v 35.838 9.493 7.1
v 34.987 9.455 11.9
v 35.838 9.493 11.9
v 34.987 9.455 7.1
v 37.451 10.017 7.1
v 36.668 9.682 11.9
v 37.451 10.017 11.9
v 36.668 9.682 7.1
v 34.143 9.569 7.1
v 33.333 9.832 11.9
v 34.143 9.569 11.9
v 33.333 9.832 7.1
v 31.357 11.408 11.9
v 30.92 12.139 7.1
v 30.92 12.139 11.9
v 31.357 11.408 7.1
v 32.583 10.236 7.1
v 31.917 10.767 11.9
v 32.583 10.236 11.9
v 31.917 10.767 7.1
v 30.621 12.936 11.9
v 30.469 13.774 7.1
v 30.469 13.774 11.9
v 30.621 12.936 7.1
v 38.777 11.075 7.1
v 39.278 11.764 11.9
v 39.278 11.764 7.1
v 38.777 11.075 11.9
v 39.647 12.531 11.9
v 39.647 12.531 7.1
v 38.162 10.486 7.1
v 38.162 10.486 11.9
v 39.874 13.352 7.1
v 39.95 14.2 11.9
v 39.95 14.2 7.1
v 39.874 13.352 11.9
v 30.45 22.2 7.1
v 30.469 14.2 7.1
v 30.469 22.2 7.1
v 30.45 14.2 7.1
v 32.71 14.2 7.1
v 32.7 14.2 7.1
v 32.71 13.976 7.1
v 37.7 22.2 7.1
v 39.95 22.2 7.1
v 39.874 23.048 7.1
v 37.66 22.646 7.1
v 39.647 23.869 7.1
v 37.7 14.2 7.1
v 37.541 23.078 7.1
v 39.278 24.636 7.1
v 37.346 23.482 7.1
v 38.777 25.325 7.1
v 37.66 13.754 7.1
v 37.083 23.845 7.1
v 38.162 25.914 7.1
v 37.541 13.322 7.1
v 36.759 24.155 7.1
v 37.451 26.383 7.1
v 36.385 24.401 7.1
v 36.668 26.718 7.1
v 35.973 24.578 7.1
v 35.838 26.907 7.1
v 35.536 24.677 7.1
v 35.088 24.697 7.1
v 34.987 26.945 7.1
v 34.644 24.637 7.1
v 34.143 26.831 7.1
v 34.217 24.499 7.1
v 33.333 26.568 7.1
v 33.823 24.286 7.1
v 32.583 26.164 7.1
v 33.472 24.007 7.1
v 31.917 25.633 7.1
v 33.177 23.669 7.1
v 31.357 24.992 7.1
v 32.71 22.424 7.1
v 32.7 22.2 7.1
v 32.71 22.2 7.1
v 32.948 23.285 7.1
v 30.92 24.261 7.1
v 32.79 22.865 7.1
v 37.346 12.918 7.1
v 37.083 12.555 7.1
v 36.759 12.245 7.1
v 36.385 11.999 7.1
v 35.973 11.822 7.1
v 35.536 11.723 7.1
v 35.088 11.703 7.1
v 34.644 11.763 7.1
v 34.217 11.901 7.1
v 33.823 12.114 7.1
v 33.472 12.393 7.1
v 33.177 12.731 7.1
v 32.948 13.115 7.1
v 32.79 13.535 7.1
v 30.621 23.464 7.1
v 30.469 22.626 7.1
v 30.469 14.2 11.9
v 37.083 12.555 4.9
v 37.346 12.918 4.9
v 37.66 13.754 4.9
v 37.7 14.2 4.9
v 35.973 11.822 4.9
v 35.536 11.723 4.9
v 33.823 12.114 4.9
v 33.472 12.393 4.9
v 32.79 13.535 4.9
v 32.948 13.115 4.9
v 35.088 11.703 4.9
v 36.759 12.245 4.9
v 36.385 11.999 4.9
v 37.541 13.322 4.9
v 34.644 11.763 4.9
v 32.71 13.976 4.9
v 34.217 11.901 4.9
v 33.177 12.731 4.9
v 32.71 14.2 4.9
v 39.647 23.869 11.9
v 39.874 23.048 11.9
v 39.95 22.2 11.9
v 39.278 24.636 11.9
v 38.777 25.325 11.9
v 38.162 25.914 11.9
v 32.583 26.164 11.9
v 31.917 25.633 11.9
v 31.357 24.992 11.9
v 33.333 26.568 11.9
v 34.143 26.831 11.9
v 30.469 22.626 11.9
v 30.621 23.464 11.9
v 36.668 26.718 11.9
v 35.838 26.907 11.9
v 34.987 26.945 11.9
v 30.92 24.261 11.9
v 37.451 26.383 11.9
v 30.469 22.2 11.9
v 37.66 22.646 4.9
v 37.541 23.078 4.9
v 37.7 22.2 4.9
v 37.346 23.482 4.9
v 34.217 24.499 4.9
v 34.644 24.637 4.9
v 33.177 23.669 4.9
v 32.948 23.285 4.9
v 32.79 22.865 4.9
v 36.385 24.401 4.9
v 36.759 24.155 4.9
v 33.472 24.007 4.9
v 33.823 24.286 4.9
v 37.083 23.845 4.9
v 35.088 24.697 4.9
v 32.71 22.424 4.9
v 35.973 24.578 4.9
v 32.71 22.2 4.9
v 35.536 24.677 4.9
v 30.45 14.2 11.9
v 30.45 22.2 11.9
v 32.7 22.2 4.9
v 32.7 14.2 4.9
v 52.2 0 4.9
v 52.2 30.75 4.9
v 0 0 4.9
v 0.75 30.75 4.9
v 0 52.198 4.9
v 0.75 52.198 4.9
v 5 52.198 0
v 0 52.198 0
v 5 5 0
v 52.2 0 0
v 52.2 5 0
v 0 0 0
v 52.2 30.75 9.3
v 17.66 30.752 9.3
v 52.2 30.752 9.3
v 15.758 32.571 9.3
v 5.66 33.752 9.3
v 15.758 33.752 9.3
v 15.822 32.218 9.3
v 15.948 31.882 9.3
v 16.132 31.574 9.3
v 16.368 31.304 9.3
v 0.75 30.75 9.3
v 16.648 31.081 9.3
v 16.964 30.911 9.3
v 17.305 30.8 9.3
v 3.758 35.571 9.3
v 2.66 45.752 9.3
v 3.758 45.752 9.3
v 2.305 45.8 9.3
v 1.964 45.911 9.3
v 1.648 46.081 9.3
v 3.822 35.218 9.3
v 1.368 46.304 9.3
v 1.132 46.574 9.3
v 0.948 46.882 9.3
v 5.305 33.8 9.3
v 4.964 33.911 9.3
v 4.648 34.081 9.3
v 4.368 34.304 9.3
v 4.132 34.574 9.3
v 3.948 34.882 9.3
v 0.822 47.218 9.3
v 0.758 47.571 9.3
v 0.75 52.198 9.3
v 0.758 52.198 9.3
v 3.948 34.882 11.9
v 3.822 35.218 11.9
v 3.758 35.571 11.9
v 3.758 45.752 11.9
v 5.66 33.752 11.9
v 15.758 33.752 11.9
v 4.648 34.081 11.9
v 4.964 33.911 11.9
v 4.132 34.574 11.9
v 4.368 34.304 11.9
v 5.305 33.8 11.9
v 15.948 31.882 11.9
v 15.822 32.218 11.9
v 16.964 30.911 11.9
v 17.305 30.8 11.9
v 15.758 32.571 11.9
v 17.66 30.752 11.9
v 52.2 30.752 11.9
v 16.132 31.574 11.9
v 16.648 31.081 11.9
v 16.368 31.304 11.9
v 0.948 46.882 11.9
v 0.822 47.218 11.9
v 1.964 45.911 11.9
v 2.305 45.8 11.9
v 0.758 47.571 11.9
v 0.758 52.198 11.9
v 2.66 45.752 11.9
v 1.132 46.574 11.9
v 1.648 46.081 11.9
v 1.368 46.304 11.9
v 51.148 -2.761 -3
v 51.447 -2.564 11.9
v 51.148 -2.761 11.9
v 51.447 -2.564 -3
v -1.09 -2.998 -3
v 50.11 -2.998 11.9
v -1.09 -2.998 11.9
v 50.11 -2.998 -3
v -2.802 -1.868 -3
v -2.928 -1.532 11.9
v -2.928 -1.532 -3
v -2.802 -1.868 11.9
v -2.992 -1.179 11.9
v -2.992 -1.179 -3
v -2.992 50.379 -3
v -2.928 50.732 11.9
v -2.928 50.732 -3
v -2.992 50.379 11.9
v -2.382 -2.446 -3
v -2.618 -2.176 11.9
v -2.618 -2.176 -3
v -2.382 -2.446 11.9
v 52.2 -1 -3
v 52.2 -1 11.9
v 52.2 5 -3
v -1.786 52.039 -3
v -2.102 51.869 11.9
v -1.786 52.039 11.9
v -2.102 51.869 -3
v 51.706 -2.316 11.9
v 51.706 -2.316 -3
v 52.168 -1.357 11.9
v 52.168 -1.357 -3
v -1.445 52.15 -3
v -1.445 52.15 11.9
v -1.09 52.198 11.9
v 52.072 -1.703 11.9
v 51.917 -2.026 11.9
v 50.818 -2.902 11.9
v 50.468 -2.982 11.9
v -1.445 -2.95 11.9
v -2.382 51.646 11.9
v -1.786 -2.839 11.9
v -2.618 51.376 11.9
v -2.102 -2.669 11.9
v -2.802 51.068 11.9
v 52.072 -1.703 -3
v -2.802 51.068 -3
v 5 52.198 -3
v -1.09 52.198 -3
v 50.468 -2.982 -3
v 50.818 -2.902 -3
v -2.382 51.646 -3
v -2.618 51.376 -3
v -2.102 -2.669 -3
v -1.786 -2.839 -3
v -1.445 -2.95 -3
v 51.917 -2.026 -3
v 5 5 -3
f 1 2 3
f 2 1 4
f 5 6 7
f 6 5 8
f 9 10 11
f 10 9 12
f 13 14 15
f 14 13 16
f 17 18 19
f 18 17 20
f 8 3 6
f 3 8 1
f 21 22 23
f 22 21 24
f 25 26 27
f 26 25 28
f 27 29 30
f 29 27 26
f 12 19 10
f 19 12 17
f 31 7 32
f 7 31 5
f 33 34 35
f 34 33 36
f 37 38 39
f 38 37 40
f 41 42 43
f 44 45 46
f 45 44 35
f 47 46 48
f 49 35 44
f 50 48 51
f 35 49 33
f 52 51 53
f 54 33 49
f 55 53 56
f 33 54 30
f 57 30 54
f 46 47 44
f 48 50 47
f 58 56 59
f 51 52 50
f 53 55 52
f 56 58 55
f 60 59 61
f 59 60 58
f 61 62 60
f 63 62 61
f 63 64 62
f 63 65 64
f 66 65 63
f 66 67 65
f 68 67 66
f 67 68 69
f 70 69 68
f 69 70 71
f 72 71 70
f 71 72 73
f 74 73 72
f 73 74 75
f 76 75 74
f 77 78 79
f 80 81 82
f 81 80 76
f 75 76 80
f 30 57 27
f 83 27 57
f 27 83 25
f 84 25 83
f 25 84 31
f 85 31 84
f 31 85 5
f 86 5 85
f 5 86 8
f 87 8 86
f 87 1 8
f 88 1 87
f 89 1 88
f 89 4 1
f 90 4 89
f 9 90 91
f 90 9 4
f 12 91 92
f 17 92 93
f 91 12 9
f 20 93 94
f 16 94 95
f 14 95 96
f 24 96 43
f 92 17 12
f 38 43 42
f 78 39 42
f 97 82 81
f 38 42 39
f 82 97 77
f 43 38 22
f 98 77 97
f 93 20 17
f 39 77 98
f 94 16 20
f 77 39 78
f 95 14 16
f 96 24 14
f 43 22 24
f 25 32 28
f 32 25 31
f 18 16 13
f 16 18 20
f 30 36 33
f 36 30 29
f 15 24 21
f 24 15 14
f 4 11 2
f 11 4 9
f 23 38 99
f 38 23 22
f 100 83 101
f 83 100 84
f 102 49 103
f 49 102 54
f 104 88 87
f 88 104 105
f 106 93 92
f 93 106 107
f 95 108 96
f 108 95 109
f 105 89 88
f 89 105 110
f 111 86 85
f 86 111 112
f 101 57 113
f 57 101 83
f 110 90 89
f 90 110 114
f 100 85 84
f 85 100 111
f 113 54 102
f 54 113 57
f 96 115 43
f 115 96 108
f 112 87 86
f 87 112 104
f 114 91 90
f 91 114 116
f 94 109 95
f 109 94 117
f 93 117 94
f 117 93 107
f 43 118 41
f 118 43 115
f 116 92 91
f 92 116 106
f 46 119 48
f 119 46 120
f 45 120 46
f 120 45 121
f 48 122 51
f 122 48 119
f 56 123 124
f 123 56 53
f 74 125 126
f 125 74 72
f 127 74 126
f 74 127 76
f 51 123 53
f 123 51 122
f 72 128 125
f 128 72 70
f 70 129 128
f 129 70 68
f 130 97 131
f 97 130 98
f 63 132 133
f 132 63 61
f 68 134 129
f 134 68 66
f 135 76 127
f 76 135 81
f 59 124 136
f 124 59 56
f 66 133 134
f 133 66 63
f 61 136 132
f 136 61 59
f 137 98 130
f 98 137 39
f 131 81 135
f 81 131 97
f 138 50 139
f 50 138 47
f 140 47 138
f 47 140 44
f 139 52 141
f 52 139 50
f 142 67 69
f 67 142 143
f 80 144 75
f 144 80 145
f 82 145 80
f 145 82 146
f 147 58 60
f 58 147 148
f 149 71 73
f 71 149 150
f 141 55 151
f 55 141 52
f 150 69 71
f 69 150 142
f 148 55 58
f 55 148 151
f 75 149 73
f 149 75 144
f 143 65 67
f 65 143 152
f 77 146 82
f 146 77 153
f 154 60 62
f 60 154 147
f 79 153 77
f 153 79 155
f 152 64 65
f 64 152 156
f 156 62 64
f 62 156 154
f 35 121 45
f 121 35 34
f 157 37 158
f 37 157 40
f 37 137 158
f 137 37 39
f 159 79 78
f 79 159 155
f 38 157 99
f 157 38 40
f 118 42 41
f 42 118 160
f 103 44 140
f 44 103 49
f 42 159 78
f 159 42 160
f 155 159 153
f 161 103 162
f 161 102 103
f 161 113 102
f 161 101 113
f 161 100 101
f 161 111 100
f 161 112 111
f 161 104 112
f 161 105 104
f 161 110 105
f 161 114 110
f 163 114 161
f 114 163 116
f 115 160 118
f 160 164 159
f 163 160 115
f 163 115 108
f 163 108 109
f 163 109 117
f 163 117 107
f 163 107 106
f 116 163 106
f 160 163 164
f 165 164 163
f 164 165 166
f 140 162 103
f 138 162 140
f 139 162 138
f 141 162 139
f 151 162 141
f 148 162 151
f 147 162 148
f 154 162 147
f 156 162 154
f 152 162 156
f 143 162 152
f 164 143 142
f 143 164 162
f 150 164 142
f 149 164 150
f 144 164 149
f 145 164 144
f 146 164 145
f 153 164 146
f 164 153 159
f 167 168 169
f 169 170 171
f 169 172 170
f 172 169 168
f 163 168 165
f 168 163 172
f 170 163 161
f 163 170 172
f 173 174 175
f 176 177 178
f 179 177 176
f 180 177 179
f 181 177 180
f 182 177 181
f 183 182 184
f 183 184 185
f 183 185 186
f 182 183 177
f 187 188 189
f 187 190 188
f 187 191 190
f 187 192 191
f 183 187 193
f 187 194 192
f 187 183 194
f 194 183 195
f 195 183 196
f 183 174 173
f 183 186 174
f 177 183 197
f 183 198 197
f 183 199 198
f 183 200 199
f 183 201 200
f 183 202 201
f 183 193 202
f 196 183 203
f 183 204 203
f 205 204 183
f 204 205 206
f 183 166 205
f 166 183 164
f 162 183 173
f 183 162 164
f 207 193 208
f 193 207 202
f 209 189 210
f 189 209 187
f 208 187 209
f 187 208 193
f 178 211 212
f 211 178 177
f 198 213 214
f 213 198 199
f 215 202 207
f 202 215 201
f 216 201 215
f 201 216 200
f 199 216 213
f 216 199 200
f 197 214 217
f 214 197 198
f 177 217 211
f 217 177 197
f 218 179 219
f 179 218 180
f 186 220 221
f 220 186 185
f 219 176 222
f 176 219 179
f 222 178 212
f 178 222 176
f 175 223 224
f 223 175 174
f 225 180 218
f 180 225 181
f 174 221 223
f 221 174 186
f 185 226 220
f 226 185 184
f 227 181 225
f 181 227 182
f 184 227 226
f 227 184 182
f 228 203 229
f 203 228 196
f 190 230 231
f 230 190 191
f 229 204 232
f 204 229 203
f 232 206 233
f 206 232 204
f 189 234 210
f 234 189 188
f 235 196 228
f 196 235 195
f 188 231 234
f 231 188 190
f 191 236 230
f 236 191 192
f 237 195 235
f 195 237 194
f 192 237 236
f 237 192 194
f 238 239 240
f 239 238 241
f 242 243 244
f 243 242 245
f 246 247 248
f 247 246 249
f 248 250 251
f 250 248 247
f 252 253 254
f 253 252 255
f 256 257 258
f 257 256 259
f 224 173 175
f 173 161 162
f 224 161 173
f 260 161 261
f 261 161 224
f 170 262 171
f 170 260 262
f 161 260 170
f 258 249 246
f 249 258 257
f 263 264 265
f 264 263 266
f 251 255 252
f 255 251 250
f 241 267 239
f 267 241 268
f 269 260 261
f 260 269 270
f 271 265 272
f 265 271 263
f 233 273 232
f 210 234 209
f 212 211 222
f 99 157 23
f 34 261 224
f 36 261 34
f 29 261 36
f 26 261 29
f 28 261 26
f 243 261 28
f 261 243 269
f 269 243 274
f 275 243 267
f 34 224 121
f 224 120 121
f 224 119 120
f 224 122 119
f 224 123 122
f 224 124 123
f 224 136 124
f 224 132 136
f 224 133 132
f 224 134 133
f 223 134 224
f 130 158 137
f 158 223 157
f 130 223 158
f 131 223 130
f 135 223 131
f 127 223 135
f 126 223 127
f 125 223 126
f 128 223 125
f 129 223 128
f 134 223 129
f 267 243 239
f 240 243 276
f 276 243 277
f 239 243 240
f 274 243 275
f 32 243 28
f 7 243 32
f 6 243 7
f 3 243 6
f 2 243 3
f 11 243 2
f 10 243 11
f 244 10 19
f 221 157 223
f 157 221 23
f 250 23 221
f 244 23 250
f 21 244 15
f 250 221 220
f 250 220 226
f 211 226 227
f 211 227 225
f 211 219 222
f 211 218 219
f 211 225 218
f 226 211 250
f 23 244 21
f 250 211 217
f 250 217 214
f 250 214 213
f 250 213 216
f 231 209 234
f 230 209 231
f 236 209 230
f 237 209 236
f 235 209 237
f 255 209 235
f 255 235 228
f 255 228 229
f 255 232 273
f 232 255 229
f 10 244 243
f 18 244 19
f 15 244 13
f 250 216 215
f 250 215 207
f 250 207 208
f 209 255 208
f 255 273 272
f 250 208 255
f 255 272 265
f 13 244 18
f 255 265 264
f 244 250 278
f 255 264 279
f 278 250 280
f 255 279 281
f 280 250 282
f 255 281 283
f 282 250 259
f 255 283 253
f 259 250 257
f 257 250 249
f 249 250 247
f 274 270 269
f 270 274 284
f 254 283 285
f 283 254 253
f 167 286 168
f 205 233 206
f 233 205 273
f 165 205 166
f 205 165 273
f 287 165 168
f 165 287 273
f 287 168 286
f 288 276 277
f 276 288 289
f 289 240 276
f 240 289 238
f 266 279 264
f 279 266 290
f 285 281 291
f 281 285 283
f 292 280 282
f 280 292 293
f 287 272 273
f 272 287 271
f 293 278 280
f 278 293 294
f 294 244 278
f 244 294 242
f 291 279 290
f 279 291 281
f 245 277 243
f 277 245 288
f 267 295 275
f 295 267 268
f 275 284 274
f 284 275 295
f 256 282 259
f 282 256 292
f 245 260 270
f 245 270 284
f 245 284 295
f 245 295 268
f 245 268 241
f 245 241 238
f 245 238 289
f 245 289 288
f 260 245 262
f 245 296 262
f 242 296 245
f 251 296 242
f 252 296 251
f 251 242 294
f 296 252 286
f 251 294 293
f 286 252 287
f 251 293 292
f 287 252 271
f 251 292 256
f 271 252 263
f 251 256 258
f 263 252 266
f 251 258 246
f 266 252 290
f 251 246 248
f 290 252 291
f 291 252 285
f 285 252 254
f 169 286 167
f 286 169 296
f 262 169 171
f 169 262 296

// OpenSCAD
/* == Customizer Settings ================================================ */
/*[Gimbal Settings]*/

// in mm [x,y,z]
bed_dimensions = [310,370,4.5];

// in mm [x,y,z], relative to front left corner bed (z = 0, screw head above bed, ignored when screw notch auto fit active)
bed_screw_position = [35, 20, 0];

// in mm [x,y,z]
bed_glass_dimensions = [310,310,4];

// in mm, optional clearance between bed and glass
bed_glass_clearance = 0.0;

// in mm, set 0 for no fillet
bed_glass_fillet_radius = 0;

// in mm [diameter, height], bolt height excluding screw head
screw_bolt_dimensions = [4.5,30];

// in mm [diameter, height]
screw_head_dimensions = [9, 1.8];

// in mm, stretch screw notch in y direction (0 for round notch only)
screw_notch_stretch = 8; // [0:25]

// in mm, 0 centered on screw
screw_notch_offset = -2; // [-25:25]

// boolean, flip screw notch from x to y axis (relevant only if stretch > 0)
screw_notch_flip_p = "yes"; // [yes,no]

// in mm, clearance between screw and screw notch (added to radius of screw and screw head)
screw_notch_clearance = 0.5;

// boolean, fit screw notch automatically, false if screw notch should onyl be inside (screw can't be used to fix clamp)
screw_notch_auto_fit_p = "yes"; // [yes,no]

// in mm, material thicknes below screw head (only used if screw notch auto fit is active)
screw_notch_auto_fit_thickness = 2;

// in mm, set 0 for no fillet
clamp_fillet_radius = 2; //[0:5]

// in mm [x,y,z], optionally tweak clearance between clamp and bed for looser(+)/tighter(-) fit
clamp_to_bed_clearance = [0.2,0.2,0.2];

// in mm [x,y,z], optionally tweak clearance between clamp and glass for looser(+)/tighter(-) fit, z only relevant if glass slice is added
clamp_to_glass_clearance = [-1.5,-1.5,0];

// in mm [x,y,z], clamp enclosing the glass where z = top thickness (ignored if slice is added)
clamp_glass_closure = [55,25,3];

// in mm [x,y,z], if x/y and z > 0 auto raise clamp and add slice on top of glass, thickness = z (offset from top of glass, overrides closure height)
clamp_glass_slice = [3,3,3];

// in mm [x,y], limit glass slice x/y width relative to glass corner, set to 0 for full size slice (full brackte x/y)
clamp_glass_slice_max_width = [15,15];

// in mm, width of the bracket below the bed (not affected by clearance, capped by clamp dimensions)
clamp_bed_bracket_width = 5;

// in mm, thickness of base material
thickness = 3; //[1:10]

// Surface detail level
resolution = 35; // [20:Draft, 35:Normal, 50:Smooth]

// toggle demo mode (show bed)
x_demo_mode_p = "no"; // [yes,no];

// toggle clamp orientation, print both 2 times
x_mirror_p = "no"; // [yes,no];

// rotate clamp for printing?
x_rotate_p = "no"; // [yes,no];

/* == Render ============================================================= */
// map yes/no strings to boolean
screw_notch_flip = screw_notch_flip_p == "yes";
screw_notch_auto_fit = screw_notch_auto_fit_p == "yes";
x_demo_mode = x_demo_mode_p == "yes";
x_mirror = x_mirror_p == "yes";
x_rotate = x_rotate_p == "yes";

// render
mirror(x_mirror ? [1,0,0] : [0,0,0])  {
    if (x_demo_mode) {
        PrintBedClampFit();
        PrintBedClamps();
    } else {
        rotate(x_rotate ? [-180,0,0] : [0,0,0]) {
            PrintBedClamp();
        }
    }
}

/* == Demo of Bed + Clamps =============================================== */
// demo print bed
module PrintBedClampFit() {
    bed_screw_position = screw_notch_auto_fit
            ? lvmult([1,1,0],bed_screw_position) + [0,0,screw_notch_auto_fit_thickness + clamp_to_bed_clearance[2]]
            : bed_screw_position;
    translate(clamp_to_bed_clearance) {
        PrintBedWithGlass(bed=bed_dimensions, glass=bed_glass_dimensions,
                          screw_pos=bed_screw_position,
                          screw=screw_bolt_dimensions, screw_head=screw_head_dimensions, 
                          glass_clear=bed_glass_clearance,
                          $fn=resolution);
    }
}
// demo clamps
module PrintBedClamps() {
    PrintBedClamp();
    mirror([1,0,0]) { translate([-bed_dimensions[0]-2*clamp_to_bed_clearance[0],0,0]) { PrintBedClamp(); } }
    mirror([0,1,0]) { translate([0,-bed_dimensions[1]-2*clamp_to_bed_clearance[1],0]) { PrintBedClamp(); } }
    mirror([1,0,0]) { mirror([0,1,0]) { {
        translate([-bed_dimensions[0]-2*clamp_to_bed_clearance[0],-bed_dimensions[1]-2*clamp_to_bed_clearance[1],0]) {
            PrintBedClamp();
        }
    } } }
}


/* == Clamp Modules ====================================================== */
// FIXME: pritty ugly and slow solution
module PrintBedClamp() {
    slice_auto_fit = max(clamp_glass_slice[0],clamp_glass_slice[1]) > 0 && clamp_glass_slice[2] > 0;
    slice_auto_z = (slice_auto_fit ? bed_glass_dimensions[2] + clamp_glass_slice[2] : clamp_glass_closure[2]);
    // base dimensions
    x = (bed_dimensions[0] - bed_glass_dimensions[0])/2 + clamp_glass_closure[0] + clamp_to_bed_clearance[0];
    y = (bed_dimensions[1] - bed_glass_dimensions[1])/2 + clamp_glass_closure[1] + clamp_to_bed_clearance[1] ;
    z = (clamp_bed_bracket_width > 0 ? thickness : 0) + 2*clamp_to_bed_clearance[2] + bed_dimensions[2] + slice_auto_z;
    
    bed = bed_dimensions + lvmult([1,1,2],clamp_to_bed_clearance);
    glass = bed_glass_dimensions + lvmult([1,1,2],clamp_to_bed_clearance)
            + [clamp_to_glass_clearance[0],
               clamp_to_glass_clearance[1],
               bed_glass_clearance-clamp_to_glass_clearance[2]];
    module PBCSoftCube(size) {
        SoftCubeLazy(size, clamp_fillet_radius, $fn=resolution);
    }
    module PBCBaseBox() {
        translate(-[thickness,thickness,(clamp_bed_bracket_width > 0 ? thickness : 0)]) {
            PBCSoftCube([x,y,z]);
        }
    }
    module PBCBedCutout() {
        bed_screw_position =
            [bed_screw_position[0] + clamp_to_bed_clearance[0],
             bed_screw_position[1] + clamp_to_bed_clearance[1],
             screw_notch_auto_fit ? (screw_notch_auto_fit_thickness + clamp_to_bed_clearance[2]) : bed_screw_position[2]];
        PrintBedWithGlass(bed=bed, glass=glass,
                          screw_pos=bed_screw_position + (screw_notch_flip?[0,screw_notch_offset,0,0]:[screw_notch_offset,0,0]),
                          screw=screw_bolt_dimensions+[screw_notch_clearance,0],
                          screw_head=screw_head_dimensions+[screw_notch_clearance,screw_notch_auto_fit?slice_auto_z:0], 
                          glass_clear=0,
                          screw_stretch=screw_notch_stretch, screw_stretch_flip=screw_notch_flip,
                          $fn=resolution);
    }
    module PBCGlassSlice() {
        union() {
            //clamp_glass_slice_max_width
            translate(lvmult(bed,[1,1,0])/2 - lvmult(glass,[1,1,0])/2 + [0,0,bed[2]+bed_glass_clearance]) { // glass position
                translate([clamp_glass_slice[0],clamp_glass_slice[1],clamp_glass_slice[2]]) {
                    PBCSoftCube(glass); // x/y base slice
                }
                if (clamp_glass_slice_max_width[0] > 0)
                    translate([max(clamp_glass_slice[0],clamp_glass_slice_max_width[0]),0,clamp_glass_slice[2]]) {
                        PBCSoftCube(glass); // x slice
                    }
                if (clamp_glass_slice_max_width[1] > 0)
                    translate([0,max(clamp_glass_slice[1],clamp_glass_slice_max_width[1]),clamp_glass_slice[2]]) {
                        PBCSoftCube(glass); // y slice
                    }
            }
        }
    }
    module PBCBelowBedCutout() {
        if (clamp_bed_bracket_width > 0) {
            translate([clamp_bed_bracket_width, clamp_bed_bracket_width, -thickness - clamp_to_bed_clearance[2]]) {
                cube([x,y,thickness + clamp_to_bed_clearance[2]]);
            }
        }
    }
    
    // test: visualize notches
    //PBCBaseBox();
    //PBCZSlice();
    //PBCBedCutout();
    //PBCBelowBedCutout();
    
    // final clamp (base box with cutouts)
    difference() {
        PBCBaseBox();
        PBCBedCutout();
        if (slice_auto_fit) PBCGlassSlice();
        PBCBelowBedCutout();
    }
}

/* == Simple Print Bed Representation ==================================== */
/* A simplified representation of a print bed with screws and glass plate
 bed                 the print bed dimensions [x,y,z]
 screw_pos           the [x,y,z] screw (holes) position, offset relative to front left corner of print bed, (z optional,
                     default: 0, screw head on top of bed)
 screw               screw dimensions [d,h] (bolt only, screw head not considered)
 screw_head          screw head dimensions [d,h]
 glass               the glass dimensions [x,y,z]
 screw_hole_clear    optional screw hole clearance (radius, default: 0)
 glass_clear         optional clearance between glass and bed (default: 0)
 screw_stretch        stretch screw (default: 0, only sencible if model is used for cutout)
 screw_stretch_flip  stretch screw x/y directly flip (default: false, only sencible if model is used for cutout)
*/
module PrintBedWithGlass(bed, glass, screw_pos, screw, screw_head,
                         screw_hole_clear=0, glass_clear=0, screw_stretch=0, screw_stretch_flip=false) {
    screw_pos = [screw_pos[0],screw_pos[1],(screw_pos[2]==undef?0:screw_pos[2])]; // 2d to 3d
    screw_pos_off = screw_pos + [0,0,-screw[1]+bed[2]]; // screw offset, z relative to bed 
    // print bed
    PrintBed(bed=bed, screw_pos=screw_pos, screw=screw, screw_head=screw_head,
             screw_hole_clear=screw_hole_clear, screw_stretch=screw_stretch, screw_stretch_flip=screw_stretch_flip);
    // glass plate with screw holes (if coliding)
    difference() {
        translate(lvmult(bed,[1,1,0])/2 - lvmult(glass,[1,1,0])/2 + [0,0,bed[2]+glass_clear]) {
            SoftCubeLazy(glass, bed_glass_fillet_radius); // glas plate
        }
        translate(screw_pos_off) { // screw holes (if colliding)
            SimpleScrewRect(rect=bed-lvmult(screw_pos,[2,2]),
                            screw=screw+[screw_hole_clear*2,0],
                            head=screw_head+[screw_hole_clear*2,0]);
        }
    }
}
//PrintBedWithGlass(bed=[200, 200, 4], glass=[160,200,3], screw_pos=[15, 15], screw=[3,30], screw_head=[7,1.5]);
//PrintBedWithGlass(bed=[200, 200, 4], glass=[200,190,3], screw_pos=[20, 20,3+0.4], screw=[3,30], screw_head=[7,1.5],
//                  screw_hole_clear=0.2, glass_clear=0.2);

/* A simplified representation of a print bed with screws
 bed                 the print bed dimensions [x,y,z]
 screw_pos           the [x,y,z] screw (holes) position, offset relative to front left corner of print bed, (z optional,
                     default: 0, screw head on top of bed)
 screw               screw dimensions [d,h] (bolt only, screw head not considered)
 screw_head          screw head dimensions [d,h]
 screw_hole_clear    optional screw hole clearance (radius, default: 0)
 screw_stretch        stretch screw (default: 0, only sencible if model is used for cutout)
 screw_stretch_flip  stretch screw x/y directly flip (default: false, only sencible if model is used for cutout)
*/
module PrintBed(bed, screw_pos, screw, screw_head, screw_hole_clear=0, screw_stretch=0, screw_stretch_flip=false) {
    screw_pos = [screw_pos[0],screw_pos[1],(screw_pos[2]==undef?0:screw_pos[2])]; // 2d to 3d
    screw_pos_off = screw_pos + [0,0,-screw[1]+bed[2]]; // screw offset, z relative to bed 
    // print bed with screw holes
    difference() {
        cube(bed); // print bed
        translate(screw_pos_off) { // screw holes
            SimpleScrewRect(rect=bed-lvmult(screw_pos,[2,2]),
                            screw=screw+[screw_hole_clear*2,0],
                            head=screw_head+[screw_hole_clear*2,0],
                            screw_stretch=screw_stretch, screw_stretch_flip=screw_stretch_flip);
        }
    }
    // screws
    translate(screw_pos_off) {
        SimpleScrewRect(rect=bed-lvmult(screw_pos,[2,2]),
                        screw=screw, head=screw_head,
                        screw_stretch=screw_stretch, screw_stretch_flip=screw_stretch_flip);
    }
}
//PrintBed(bed=[200, 200, 4], screw_pos=[20, 20], screw=[3,30], screw_head=[7,1.5]);
//PrintBed(bed=[200, 200, 4], screw_pos=[10, 20,-1.2], screw=[3,30], screw_head=[7,1.5], screw_hole_clear=0.2);
//PrintBed(bed=[200, 200, 4], screw_pos=[20, 20], screw=[3,30], screw_head=[7,1.5], screw_stretch=4, screw_stretch_flip=true);

/* == Simple Screw / Screw Notch ========================================= */
/* 4 SimpleScrews positioned in a rectangle
 rect  rectangle dimensions, a SimpleScrew is positiond in each corner [x,y]
 screw               screw dimensions [d,h] (bolt only, screw head not considered)
 head                screw head dimensions [d,h]
 screw_stretch        stretch screw (default: 0, sencible if model is used for cutout)
 screw_stretch_flip  stretch screw x/y directly flip (default: false, sencible if model is used for cutout)
*/
module SimpleScrewRect(rect, screw, head, screw_stretch=true, screw_stretch_flip=false) {
    rotate([0,0,screw_stretch_flip?0:90]) {
        SimpleScrewStretched(screw, head, screw_stretch);
    }
    translate(lvmult([1,0],rect)) {
        rotate([0,0,screw_stretch_flip?0:90]) {
            SimpleScrewStretched(screw, head, screw_stretch);
        }
    }
    translate(lvmult([0,1],rect)) {
        rotate([0,0,screw_stretch_flip?0:90]) {
            SimpleScrewStretched(screw, head, screw_stretch);
        }
    }
    translate(lvmult([1,1],rect)) { // ignore 3rd dimension
        rotate([0,0,screw_stretch_flip?0:90]) {
            SimpleScrewStretched(screw, head, screw_stretch);
        }
    }
}
//SimpleScrewRect(rect=[50,100], screw=[3,30], head=[7,1.5], stretch=15);


/* A simplified screw tretched in y axis
   Can be used (difference) to add a screw notch. Screw and head needs to be tweeked
   accordingly (clearance, material thickness, etc.)
 screw  screw dimensions [d,h] (bolt only, screw head not considered)
 head   screw head dimensions [d,h]
 stretch  distance between the center (screw axis) of two combined screws
*/
module SimpleScrewStretched(screw, head, stretch) {
    union() {
        translate(-[0,stretch/2,0]) {
            SimpleScrew(screw, head);
        }
        // screw head guide
        translate([0,0,head[1]/2 + screw[1]]) {
            cube([head[0],
                  stretch,
                  head[1]],
                  center=true);
        }    
        // screw guide
        translate([0,0,screw[1]/2]) {
            cube([screw[0],
                  stretch,
                  screw[1]],
                  center=true);
        }
        translate([0,stretch/2,0]) {
            SimpleScrew(screw, head);
        }
    }
}
//SimpleScrewStretched(screw=[3,30], head=[7,1.5], stretch=15);

/* A simplified screw
 screw  screw dimensions [d,h] (bolt only, screw head not considered)
 head   screw head dimensions [d,h]
*/
module SimpleScrew(screw, head) {
    union() {
        // screw head guide
        translate([0,0,screw[1]]) {
            cylinder(d=head[0], h=head[1]);
        }
        // screw guide
        cylinder(d=screw[0], h=screw[1]);
    }
}
//SimpleScrew(screw=[3,30], head=[7,1.5]);


/* == Fillet ============================================================= */
/* cube with softened (z-axis) edges, lazy version
 size    [x,y,z]
 radius  fillet radius, standard cube if <= 0, limited to x/y dimensions (fully rounded x/y edges)
 expand  fillet, size defines outer dimensions (false, default) or add radius to x/y size (true)
 center  center cube (default: false)
 - based on https://www.thingiverse.com/thing:9347
*/
module SoftCubeLazy(size, radius, expand=false, center=false) {
    if (radius <= 0) { // standard cube, no fillet
        cube(size, center);
    } else {
        x = size[0]; y = size[1]; z = size[2];
        r = min(x/(expand ? 1 : 2), y/(expand ? 1 : 2), radius); // maximum radius (must not exceed x/y dimensions)
        off = r / (expand ? 2 : 1);
        translate (center ? [0,0,-z/2] : [x/2,y/2,0]) {
            linear_extrude(height=z) hull() {
                // place 4 circles in the corners, with the given radius
                translate([-x/2 + off, -y/2 + off, 0]) circle(r);
                translate([ x/2 - off, -y/2 + off, 0]) circle(r);
                translate([-x/2 + off,  y/2 - off, 0]) circle(r);
                translate([ x/2 - off,  y/2 - off, 0]) circle(r);
            }
        }
    }
}
//SoftCubeLazy([20,20,20], 2, $fn=50);
//SoftCubeLazy([40,10,20], 220, center=true, $fn=50);
//SoftCubeLazy([20,10,20], 200, expand=true, center=true, $fn=50);

/* cube with softened (z-axis) edges, strict version
 size    [x,y,z]
 radius  fillet radius, standard cube if <= 0, must be <= 1/2* min(x,y) or <= min(x,y) if expand = true
 expand  fillet, size defines outer dimensions (false, default) or add radius to x/y size (true)
 center  center cube (default: false)
 - based on https://www.thingiverse.com/thing:9347
*/
module SoftCube(size, radius, expand=false, center=false) {
    x = size[0]; y = size[1]; z = size[2];
    assert(radius >= 0, "radius must be >= 0");
    if (expand) {
        assert(radius <= x, "radius must be <= x when expand = true");
        assert(radius <= y, "radius must be <= y when expand = true");
    }  else {
        assert(radius <= x/2, "radius must be <= x/2 when expand = false");
        assert(radius <= y/2, "radius must be <= y/2 when expand = false");
    }    
    if (radius <= 0) { // standard cube, no fillet
        cube(size, center);
    } else {
        off = radius / (expand ? 2 : 1);
        translate (center ? [0,0,-z/2] : [x/2,y/2,0]) {
            linear_extrude(height=z) hull() {
                // place 4 circles in the corners, with the given radius
                translate([-x/2 + off, -y/2 + off, 0]) circle(radius);
                translate([ x/2 - off, -y/2 + off, 0]) circle(radius);
                translate([-x/2 + off,  y/2 - off, 0]) circle(radius);
                translate([ x/2 - off,  y/2 - off, 0]) circle(radius);
            }
        }
    }
}
//SoftCube([20,20,20], 2, $fn=50);
//SoftCube([40,10,20], 5, center=true, $fn=50);
//SoftCube([20,10,20], 10, expand=true, center=true, $fn=50);

/* == Matrix Math ======================================================== */
/* lazy vector multiplication, multiply up to 4 vectors with 2 or 3 dimensions
   v1 is used to identify max dimensions
   if v2 to v4 have more dimensions they are ignored
   if v2 to v4 have less dimensions 1 is assumumed */
function lvmult(v1, v2=[1,1,1], v3=[1,1,1], v4=[1,1,1]) =
    v1[2] == undef
      ? [v1[0]*v2[0]*v3[0]*v4[0],
         v1[1]*v2[1]*v3[1]*v4[1]]
      : [v1[0]*v2[0]*v3[0]*v4[0],
         v1[1]*v2[1]*v3[1]*v4[1],
         v1[2]*(v2[2]==undef?1:v2[2])*(v3[2]==undef?1:v3[2])*(v4[2]==undef?1:v4[2])];
//echo(lvmult([2,3],[3,4]));
//echo(lvmult([10,20,30],[2,3]));
//echo(lvmult([10,20,30],[2,3,4],[10,10,10],[2,2,2]));
//echo(lvmult([2,3],[3,4,1]));

/* lazy vector division, divide up to 4 vectors with 2 or 3 dimensions
   v1 is used to identify the dimensions
   if v2 to v4 have more dimensions they are ignored
   if v2 to v4 have less dimensions 1 is assumumed */
function lvdiv(v1, v2=[1,1,1], v3=[1,1,1], v4=[1,1,1]) =
    v1[2] == undef
      ? [v1[0]/v2[0]/v3[0]/v4[0],
         v1[1]/v2[1]/v3[1]/v4[1]]
      : [v1[0]/v2[0]/v3[0]/v4[0],
         v1[1]/v2[1]/v3[1]/v4[1],
         v1[2]/(v2[2]==undef?1:v2[2])/(v3[2]==undef?1:v3[2])/(v4[2]==undef?1:v4[2])];
//echo(lvdiv([10,20,30],[2,3,4]));
//echo(lvdiv([10,20,30],[2,3,4],[10,10,10],[2,2,2]));
//echo(lvdiv([2,3],[3,4,1]));
